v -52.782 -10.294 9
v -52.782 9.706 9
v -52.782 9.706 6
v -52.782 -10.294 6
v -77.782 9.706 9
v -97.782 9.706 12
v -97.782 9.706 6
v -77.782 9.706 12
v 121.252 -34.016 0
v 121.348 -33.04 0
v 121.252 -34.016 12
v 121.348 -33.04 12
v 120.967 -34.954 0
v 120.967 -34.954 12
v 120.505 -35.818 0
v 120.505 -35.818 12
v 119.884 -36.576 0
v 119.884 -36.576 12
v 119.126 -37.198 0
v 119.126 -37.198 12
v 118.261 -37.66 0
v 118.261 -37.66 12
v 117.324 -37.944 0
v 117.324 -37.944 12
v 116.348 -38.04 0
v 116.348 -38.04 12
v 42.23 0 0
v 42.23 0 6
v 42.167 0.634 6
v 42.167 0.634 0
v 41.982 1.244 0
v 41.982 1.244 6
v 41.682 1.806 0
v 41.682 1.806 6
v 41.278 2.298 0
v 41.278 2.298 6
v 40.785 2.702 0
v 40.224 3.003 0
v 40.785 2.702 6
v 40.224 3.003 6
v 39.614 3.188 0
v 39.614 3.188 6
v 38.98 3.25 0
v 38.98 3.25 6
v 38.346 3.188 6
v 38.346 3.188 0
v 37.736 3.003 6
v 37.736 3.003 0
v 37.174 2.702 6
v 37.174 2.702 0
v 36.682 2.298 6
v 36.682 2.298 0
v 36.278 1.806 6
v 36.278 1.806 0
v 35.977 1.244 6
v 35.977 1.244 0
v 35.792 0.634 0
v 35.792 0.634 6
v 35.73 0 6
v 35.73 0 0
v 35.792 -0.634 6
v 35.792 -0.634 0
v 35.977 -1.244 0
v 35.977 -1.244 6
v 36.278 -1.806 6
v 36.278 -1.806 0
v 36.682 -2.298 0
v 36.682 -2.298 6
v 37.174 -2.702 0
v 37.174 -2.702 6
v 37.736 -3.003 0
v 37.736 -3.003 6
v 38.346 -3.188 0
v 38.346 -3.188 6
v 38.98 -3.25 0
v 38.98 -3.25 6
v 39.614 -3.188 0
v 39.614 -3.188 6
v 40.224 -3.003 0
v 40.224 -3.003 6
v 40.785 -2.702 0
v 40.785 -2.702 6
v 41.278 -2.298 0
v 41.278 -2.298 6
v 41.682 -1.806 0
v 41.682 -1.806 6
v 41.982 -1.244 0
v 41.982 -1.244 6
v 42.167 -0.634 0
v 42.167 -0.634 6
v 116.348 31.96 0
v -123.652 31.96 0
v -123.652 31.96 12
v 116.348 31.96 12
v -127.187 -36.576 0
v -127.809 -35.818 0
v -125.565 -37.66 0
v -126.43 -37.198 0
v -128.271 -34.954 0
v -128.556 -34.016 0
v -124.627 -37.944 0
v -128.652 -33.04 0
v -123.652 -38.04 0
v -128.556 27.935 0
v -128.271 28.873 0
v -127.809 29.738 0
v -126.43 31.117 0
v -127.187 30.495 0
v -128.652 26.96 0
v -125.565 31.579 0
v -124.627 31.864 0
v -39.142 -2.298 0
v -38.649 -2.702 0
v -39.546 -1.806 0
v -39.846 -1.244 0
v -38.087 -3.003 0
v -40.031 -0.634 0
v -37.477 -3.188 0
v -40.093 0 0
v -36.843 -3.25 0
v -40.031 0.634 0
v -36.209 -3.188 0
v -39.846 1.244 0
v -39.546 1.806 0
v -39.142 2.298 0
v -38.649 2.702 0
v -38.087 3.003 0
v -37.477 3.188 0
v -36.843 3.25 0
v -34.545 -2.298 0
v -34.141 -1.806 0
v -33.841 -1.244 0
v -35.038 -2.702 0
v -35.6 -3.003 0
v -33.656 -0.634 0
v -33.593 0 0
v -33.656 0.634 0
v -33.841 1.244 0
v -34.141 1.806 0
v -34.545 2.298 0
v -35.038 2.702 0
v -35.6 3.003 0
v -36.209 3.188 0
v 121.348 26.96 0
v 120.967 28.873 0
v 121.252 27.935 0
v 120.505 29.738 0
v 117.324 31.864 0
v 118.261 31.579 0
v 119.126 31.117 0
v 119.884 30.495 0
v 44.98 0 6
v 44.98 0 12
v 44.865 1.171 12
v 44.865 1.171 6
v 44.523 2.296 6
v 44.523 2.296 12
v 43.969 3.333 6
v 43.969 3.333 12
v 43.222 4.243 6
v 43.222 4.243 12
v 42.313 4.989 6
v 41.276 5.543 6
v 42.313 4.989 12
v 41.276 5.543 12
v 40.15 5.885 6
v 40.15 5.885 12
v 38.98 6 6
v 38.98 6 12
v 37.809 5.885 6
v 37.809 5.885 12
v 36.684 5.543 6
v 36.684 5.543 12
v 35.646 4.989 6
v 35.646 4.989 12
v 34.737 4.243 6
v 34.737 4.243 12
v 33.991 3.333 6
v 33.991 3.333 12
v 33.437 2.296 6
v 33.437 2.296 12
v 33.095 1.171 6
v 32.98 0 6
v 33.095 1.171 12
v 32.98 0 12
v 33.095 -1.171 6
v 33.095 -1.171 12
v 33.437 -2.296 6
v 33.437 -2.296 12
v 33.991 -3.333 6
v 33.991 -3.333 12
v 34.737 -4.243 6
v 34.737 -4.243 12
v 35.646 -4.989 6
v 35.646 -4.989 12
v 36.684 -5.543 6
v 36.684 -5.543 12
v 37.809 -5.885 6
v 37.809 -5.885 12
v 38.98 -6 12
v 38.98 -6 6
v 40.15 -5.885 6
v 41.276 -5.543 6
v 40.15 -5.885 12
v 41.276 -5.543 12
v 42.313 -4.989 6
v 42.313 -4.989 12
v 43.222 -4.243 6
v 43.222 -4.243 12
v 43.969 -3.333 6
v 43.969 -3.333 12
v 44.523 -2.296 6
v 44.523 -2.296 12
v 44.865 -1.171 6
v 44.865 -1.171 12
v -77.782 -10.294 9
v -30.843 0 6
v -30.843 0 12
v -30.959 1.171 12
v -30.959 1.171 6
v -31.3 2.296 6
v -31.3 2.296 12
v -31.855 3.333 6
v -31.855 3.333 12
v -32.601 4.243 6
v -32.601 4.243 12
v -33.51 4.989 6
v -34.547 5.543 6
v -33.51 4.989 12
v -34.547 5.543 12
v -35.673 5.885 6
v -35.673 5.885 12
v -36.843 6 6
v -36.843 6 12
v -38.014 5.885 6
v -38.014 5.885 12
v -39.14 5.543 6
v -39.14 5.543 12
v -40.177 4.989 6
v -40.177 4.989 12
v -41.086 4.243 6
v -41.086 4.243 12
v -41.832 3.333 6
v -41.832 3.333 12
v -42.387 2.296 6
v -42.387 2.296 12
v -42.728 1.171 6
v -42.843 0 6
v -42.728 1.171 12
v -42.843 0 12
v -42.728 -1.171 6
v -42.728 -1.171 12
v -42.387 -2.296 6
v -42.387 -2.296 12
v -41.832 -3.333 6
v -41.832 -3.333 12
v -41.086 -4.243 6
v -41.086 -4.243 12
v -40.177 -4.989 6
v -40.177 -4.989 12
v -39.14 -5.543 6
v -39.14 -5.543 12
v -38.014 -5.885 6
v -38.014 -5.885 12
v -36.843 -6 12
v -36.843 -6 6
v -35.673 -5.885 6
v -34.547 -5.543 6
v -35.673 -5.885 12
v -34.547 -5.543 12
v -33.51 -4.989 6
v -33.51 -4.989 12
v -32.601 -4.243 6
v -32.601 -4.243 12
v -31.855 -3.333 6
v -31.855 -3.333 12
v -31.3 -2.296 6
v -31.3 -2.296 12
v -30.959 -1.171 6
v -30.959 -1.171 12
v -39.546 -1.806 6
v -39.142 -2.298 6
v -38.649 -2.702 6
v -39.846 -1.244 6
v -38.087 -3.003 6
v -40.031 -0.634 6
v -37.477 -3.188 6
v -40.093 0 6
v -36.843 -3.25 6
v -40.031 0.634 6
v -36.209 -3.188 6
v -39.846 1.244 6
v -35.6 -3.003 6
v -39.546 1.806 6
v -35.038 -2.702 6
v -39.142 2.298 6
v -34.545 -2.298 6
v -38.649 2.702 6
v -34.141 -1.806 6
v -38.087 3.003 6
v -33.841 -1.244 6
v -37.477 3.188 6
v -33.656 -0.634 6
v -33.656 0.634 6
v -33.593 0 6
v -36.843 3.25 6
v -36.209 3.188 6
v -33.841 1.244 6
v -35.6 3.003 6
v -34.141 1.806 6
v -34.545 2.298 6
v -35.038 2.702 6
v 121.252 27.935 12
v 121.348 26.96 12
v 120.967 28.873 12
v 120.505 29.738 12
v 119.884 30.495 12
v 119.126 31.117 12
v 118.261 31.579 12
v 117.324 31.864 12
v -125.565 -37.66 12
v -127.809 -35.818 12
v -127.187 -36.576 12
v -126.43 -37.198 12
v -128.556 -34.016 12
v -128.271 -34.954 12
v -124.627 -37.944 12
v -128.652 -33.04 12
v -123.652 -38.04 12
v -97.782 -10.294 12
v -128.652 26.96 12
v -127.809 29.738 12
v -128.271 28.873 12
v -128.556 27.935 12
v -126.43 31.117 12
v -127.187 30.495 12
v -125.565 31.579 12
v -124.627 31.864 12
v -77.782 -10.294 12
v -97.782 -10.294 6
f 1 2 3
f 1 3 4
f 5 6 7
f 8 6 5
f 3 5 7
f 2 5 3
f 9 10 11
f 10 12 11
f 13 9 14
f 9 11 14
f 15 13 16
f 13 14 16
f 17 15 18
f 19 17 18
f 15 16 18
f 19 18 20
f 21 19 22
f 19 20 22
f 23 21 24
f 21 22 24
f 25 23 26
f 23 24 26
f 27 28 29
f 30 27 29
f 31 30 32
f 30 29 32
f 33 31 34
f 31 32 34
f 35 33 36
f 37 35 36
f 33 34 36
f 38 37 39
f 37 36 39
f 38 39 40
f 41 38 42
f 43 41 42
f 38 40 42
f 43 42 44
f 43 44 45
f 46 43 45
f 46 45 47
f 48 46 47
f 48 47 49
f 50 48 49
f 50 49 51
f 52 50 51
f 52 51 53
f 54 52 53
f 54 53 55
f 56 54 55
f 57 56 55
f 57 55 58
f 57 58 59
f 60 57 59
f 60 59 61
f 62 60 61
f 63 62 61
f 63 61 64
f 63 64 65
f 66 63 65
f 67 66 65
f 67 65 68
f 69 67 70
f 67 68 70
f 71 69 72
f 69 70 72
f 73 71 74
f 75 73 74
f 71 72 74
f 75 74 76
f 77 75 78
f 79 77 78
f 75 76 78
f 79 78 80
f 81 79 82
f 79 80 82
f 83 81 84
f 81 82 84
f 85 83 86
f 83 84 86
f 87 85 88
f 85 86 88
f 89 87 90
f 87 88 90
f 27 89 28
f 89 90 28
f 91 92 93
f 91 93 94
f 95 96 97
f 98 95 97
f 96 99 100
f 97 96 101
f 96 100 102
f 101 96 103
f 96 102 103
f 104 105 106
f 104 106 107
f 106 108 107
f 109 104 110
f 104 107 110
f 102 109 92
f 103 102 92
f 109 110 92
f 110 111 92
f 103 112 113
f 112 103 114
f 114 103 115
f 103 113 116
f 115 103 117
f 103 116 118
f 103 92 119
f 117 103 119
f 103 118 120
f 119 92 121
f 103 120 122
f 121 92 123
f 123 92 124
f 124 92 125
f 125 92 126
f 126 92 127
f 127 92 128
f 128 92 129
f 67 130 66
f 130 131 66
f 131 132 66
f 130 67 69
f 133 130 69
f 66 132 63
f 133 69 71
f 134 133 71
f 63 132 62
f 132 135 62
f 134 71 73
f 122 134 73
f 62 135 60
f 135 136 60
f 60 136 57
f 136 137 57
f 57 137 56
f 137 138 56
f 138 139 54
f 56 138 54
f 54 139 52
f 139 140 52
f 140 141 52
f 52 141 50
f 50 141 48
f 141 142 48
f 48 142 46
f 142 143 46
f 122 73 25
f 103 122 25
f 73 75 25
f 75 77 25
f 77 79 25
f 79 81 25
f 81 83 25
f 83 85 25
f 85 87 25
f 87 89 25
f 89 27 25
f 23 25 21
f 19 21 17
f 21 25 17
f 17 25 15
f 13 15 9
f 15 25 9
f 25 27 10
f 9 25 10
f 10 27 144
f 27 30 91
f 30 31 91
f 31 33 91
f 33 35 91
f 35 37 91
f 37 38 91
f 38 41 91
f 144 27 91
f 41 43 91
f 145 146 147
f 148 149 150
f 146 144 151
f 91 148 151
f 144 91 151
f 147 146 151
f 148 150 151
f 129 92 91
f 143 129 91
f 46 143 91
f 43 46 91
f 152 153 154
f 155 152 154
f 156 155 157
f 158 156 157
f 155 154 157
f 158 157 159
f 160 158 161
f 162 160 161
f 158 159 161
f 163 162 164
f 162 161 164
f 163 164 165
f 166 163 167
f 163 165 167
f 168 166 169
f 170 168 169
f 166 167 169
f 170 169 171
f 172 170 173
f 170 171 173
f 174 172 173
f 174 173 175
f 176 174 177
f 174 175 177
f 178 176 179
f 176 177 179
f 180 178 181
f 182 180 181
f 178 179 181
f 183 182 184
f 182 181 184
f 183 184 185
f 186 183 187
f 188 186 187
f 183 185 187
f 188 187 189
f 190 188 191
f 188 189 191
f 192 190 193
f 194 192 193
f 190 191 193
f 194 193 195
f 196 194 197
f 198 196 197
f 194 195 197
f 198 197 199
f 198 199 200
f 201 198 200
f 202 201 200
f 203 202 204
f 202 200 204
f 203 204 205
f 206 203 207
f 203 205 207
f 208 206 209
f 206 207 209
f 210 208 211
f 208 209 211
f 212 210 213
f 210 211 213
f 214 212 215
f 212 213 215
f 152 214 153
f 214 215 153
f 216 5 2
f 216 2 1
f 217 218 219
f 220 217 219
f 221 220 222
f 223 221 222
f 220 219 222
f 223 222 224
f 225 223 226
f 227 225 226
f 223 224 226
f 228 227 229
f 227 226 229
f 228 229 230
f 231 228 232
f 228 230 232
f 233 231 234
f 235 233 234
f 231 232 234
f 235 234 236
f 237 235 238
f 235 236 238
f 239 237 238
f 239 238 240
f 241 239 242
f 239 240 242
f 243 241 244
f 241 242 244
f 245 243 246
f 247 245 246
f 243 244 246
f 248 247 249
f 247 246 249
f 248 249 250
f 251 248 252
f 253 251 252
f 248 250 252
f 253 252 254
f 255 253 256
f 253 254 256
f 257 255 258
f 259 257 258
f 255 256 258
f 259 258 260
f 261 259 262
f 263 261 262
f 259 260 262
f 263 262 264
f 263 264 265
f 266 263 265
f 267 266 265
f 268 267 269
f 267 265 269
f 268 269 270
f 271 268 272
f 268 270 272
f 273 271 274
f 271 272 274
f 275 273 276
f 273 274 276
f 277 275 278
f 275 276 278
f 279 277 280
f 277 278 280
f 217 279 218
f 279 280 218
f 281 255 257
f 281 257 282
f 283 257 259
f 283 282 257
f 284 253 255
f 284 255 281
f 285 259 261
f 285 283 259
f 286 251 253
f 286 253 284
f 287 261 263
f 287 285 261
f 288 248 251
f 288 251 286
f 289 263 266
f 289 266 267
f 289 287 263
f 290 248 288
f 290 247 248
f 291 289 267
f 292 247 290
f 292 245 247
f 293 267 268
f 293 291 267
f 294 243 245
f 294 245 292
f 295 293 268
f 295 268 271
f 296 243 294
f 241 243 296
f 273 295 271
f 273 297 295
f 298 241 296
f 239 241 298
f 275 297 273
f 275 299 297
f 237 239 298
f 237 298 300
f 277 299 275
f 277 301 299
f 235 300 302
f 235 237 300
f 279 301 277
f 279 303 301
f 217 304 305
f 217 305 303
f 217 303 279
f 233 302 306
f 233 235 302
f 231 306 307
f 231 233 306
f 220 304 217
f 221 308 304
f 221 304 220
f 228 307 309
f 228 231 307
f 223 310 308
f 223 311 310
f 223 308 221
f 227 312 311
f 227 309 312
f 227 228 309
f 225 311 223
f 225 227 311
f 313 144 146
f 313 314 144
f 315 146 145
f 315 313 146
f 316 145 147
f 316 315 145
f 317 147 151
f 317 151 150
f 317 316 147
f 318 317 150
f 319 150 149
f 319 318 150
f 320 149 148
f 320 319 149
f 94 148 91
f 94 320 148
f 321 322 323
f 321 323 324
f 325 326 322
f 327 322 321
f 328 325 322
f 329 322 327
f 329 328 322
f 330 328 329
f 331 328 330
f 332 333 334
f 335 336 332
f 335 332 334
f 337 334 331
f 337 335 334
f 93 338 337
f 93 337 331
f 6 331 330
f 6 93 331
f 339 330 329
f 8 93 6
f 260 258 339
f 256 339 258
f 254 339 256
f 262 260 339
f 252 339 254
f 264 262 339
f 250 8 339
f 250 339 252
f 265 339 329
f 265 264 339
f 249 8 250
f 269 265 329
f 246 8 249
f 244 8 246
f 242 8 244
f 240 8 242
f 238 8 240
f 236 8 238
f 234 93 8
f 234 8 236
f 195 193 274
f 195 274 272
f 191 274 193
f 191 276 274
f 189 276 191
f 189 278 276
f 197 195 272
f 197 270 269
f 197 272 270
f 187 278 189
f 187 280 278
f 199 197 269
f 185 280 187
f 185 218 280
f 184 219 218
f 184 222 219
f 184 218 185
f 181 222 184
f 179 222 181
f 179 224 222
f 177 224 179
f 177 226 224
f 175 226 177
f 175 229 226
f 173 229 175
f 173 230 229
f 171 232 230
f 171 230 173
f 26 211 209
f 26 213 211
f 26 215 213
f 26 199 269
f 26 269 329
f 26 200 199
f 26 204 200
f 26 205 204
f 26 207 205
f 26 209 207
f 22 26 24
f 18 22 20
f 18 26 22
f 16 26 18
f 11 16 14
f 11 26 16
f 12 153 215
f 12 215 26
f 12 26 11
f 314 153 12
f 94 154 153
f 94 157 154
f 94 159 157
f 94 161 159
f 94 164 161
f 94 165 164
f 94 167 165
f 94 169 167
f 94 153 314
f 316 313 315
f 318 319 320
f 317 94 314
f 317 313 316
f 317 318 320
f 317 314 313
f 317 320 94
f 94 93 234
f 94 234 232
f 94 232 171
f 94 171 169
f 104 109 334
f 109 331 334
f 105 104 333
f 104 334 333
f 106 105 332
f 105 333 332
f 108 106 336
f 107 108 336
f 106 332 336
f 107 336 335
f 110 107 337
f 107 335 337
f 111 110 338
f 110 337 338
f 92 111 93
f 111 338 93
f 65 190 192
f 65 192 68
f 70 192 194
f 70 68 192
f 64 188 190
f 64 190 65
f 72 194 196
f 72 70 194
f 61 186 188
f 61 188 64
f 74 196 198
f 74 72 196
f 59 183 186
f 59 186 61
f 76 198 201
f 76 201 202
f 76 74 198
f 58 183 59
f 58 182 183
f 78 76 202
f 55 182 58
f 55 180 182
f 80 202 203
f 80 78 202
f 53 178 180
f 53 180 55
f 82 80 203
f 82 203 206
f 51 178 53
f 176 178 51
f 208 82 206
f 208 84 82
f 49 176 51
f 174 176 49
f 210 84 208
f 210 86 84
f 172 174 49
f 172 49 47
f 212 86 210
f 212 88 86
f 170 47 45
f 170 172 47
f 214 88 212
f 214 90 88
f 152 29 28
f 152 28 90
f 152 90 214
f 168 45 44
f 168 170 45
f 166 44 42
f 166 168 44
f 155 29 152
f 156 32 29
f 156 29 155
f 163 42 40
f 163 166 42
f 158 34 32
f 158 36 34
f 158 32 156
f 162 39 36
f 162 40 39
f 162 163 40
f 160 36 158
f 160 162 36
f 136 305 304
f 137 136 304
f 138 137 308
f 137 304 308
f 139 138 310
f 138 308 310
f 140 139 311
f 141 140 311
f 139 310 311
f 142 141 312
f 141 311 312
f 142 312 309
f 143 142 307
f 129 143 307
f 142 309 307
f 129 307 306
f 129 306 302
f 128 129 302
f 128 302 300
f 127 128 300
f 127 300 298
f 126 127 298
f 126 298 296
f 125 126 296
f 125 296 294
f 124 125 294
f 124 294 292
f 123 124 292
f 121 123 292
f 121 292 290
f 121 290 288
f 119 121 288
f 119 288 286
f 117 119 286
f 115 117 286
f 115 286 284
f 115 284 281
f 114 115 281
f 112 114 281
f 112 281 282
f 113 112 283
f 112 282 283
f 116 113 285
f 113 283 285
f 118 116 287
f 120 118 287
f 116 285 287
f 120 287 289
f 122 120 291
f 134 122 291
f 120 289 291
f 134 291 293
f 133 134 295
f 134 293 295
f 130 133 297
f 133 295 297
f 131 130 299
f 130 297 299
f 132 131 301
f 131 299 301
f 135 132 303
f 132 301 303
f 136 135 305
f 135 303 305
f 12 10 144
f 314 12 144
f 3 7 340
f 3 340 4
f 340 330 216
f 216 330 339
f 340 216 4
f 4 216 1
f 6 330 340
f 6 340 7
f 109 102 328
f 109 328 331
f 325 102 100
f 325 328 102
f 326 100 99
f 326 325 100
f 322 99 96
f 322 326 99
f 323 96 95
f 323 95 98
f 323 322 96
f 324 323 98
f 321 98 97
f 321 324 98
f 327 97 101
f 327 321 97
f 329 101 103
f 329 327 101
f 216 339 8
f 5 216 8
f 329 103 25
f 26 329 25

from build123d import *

# Parameters (mm, degrees)
F0_W          = 250
F0_H          = 70
F1_DEPTH      = 12
F2_R          = 3.25
F3_DEPTH      = 25
F4_R          = 6
F5_DEPTH      = 6
F6_W          = 20
F6_H          = 20
F7_DEPTH      = 6
F8_W          = 20
F8_H          = 3
F9_DEPTH      = 20
F9_DEPTH_BACK = 25
F10_R         = 5


with BuildPart() as f1:
    # F0 (on Top) → F1 (new body)
    with BuildSketch(Plane.XY):
        with Locations((-3.651918, -3.040215)):
            Rectangle(F0_W, F0_H)
    extrude(amount=F1_DEPTH)

    # F2 (on face) → F3 (cut)
    with BuildSketch(Plane.XY.offset(12)):
        with Locations((-36.843423, 0)):
            Circle(F2_R)
        with Locations((38.979828, 0)):
            Circle(F2_R)
    extrude(amount=-F3_DEPTH, mode=Mode.SUBTRACT)

    # F4 (on face) → F5 (cut)
    with BuildSketch(Plane.XY.offset(12)):
        with Locations((-36.843423, 0)):
            Circle(F4_R)
        with Locations((38.979828, 0)):
            Circle(F4_R)
    extrude(amount=-F5_DEPTH, mode=Mode.SUBTRACT)

    # F6 (on face) → F7 (cut)
    with BuildSketch(Plane.XY.offset(12)):
        with Locations((-87.782149, -0.293668)):
            Rectangle(F6_W, F6_H)
    extrude(amount=-F7_DEPTH, mode=Mode.SUBTRACT)

    # F8 (on face) → F9 (cut, two sides)
    with BuildSketch(Plane(origin=(-77.782149, 0, 0), x_dir=(0, -1, 0), z_dir=(-1, 0, 0))) as f9_sk:
        with Locations((0.293668, 7.5)):
            Rectangle(F8_W, F8_H)
    extrude(amount=F9_DEPTH, mode=Mode.SUBTRACT)
    extrude(f9_sk.sketch, amount=-F9_DEPTH_BACK, mode=Mode.SUBTRACT)

    # F10
    f10_edges = [f1.edges().sort_by_distance(p)[0] for p in [
        (-128.651918, -38.040215, 6),
        (-128.651918, 31.959785, 6),
        (121.348082, -38.040215, 6),
        (121.348082, 31.959785, 6),
    ]]
    fillet(f10_edges, radius=F10_R)


solid = f1.part
